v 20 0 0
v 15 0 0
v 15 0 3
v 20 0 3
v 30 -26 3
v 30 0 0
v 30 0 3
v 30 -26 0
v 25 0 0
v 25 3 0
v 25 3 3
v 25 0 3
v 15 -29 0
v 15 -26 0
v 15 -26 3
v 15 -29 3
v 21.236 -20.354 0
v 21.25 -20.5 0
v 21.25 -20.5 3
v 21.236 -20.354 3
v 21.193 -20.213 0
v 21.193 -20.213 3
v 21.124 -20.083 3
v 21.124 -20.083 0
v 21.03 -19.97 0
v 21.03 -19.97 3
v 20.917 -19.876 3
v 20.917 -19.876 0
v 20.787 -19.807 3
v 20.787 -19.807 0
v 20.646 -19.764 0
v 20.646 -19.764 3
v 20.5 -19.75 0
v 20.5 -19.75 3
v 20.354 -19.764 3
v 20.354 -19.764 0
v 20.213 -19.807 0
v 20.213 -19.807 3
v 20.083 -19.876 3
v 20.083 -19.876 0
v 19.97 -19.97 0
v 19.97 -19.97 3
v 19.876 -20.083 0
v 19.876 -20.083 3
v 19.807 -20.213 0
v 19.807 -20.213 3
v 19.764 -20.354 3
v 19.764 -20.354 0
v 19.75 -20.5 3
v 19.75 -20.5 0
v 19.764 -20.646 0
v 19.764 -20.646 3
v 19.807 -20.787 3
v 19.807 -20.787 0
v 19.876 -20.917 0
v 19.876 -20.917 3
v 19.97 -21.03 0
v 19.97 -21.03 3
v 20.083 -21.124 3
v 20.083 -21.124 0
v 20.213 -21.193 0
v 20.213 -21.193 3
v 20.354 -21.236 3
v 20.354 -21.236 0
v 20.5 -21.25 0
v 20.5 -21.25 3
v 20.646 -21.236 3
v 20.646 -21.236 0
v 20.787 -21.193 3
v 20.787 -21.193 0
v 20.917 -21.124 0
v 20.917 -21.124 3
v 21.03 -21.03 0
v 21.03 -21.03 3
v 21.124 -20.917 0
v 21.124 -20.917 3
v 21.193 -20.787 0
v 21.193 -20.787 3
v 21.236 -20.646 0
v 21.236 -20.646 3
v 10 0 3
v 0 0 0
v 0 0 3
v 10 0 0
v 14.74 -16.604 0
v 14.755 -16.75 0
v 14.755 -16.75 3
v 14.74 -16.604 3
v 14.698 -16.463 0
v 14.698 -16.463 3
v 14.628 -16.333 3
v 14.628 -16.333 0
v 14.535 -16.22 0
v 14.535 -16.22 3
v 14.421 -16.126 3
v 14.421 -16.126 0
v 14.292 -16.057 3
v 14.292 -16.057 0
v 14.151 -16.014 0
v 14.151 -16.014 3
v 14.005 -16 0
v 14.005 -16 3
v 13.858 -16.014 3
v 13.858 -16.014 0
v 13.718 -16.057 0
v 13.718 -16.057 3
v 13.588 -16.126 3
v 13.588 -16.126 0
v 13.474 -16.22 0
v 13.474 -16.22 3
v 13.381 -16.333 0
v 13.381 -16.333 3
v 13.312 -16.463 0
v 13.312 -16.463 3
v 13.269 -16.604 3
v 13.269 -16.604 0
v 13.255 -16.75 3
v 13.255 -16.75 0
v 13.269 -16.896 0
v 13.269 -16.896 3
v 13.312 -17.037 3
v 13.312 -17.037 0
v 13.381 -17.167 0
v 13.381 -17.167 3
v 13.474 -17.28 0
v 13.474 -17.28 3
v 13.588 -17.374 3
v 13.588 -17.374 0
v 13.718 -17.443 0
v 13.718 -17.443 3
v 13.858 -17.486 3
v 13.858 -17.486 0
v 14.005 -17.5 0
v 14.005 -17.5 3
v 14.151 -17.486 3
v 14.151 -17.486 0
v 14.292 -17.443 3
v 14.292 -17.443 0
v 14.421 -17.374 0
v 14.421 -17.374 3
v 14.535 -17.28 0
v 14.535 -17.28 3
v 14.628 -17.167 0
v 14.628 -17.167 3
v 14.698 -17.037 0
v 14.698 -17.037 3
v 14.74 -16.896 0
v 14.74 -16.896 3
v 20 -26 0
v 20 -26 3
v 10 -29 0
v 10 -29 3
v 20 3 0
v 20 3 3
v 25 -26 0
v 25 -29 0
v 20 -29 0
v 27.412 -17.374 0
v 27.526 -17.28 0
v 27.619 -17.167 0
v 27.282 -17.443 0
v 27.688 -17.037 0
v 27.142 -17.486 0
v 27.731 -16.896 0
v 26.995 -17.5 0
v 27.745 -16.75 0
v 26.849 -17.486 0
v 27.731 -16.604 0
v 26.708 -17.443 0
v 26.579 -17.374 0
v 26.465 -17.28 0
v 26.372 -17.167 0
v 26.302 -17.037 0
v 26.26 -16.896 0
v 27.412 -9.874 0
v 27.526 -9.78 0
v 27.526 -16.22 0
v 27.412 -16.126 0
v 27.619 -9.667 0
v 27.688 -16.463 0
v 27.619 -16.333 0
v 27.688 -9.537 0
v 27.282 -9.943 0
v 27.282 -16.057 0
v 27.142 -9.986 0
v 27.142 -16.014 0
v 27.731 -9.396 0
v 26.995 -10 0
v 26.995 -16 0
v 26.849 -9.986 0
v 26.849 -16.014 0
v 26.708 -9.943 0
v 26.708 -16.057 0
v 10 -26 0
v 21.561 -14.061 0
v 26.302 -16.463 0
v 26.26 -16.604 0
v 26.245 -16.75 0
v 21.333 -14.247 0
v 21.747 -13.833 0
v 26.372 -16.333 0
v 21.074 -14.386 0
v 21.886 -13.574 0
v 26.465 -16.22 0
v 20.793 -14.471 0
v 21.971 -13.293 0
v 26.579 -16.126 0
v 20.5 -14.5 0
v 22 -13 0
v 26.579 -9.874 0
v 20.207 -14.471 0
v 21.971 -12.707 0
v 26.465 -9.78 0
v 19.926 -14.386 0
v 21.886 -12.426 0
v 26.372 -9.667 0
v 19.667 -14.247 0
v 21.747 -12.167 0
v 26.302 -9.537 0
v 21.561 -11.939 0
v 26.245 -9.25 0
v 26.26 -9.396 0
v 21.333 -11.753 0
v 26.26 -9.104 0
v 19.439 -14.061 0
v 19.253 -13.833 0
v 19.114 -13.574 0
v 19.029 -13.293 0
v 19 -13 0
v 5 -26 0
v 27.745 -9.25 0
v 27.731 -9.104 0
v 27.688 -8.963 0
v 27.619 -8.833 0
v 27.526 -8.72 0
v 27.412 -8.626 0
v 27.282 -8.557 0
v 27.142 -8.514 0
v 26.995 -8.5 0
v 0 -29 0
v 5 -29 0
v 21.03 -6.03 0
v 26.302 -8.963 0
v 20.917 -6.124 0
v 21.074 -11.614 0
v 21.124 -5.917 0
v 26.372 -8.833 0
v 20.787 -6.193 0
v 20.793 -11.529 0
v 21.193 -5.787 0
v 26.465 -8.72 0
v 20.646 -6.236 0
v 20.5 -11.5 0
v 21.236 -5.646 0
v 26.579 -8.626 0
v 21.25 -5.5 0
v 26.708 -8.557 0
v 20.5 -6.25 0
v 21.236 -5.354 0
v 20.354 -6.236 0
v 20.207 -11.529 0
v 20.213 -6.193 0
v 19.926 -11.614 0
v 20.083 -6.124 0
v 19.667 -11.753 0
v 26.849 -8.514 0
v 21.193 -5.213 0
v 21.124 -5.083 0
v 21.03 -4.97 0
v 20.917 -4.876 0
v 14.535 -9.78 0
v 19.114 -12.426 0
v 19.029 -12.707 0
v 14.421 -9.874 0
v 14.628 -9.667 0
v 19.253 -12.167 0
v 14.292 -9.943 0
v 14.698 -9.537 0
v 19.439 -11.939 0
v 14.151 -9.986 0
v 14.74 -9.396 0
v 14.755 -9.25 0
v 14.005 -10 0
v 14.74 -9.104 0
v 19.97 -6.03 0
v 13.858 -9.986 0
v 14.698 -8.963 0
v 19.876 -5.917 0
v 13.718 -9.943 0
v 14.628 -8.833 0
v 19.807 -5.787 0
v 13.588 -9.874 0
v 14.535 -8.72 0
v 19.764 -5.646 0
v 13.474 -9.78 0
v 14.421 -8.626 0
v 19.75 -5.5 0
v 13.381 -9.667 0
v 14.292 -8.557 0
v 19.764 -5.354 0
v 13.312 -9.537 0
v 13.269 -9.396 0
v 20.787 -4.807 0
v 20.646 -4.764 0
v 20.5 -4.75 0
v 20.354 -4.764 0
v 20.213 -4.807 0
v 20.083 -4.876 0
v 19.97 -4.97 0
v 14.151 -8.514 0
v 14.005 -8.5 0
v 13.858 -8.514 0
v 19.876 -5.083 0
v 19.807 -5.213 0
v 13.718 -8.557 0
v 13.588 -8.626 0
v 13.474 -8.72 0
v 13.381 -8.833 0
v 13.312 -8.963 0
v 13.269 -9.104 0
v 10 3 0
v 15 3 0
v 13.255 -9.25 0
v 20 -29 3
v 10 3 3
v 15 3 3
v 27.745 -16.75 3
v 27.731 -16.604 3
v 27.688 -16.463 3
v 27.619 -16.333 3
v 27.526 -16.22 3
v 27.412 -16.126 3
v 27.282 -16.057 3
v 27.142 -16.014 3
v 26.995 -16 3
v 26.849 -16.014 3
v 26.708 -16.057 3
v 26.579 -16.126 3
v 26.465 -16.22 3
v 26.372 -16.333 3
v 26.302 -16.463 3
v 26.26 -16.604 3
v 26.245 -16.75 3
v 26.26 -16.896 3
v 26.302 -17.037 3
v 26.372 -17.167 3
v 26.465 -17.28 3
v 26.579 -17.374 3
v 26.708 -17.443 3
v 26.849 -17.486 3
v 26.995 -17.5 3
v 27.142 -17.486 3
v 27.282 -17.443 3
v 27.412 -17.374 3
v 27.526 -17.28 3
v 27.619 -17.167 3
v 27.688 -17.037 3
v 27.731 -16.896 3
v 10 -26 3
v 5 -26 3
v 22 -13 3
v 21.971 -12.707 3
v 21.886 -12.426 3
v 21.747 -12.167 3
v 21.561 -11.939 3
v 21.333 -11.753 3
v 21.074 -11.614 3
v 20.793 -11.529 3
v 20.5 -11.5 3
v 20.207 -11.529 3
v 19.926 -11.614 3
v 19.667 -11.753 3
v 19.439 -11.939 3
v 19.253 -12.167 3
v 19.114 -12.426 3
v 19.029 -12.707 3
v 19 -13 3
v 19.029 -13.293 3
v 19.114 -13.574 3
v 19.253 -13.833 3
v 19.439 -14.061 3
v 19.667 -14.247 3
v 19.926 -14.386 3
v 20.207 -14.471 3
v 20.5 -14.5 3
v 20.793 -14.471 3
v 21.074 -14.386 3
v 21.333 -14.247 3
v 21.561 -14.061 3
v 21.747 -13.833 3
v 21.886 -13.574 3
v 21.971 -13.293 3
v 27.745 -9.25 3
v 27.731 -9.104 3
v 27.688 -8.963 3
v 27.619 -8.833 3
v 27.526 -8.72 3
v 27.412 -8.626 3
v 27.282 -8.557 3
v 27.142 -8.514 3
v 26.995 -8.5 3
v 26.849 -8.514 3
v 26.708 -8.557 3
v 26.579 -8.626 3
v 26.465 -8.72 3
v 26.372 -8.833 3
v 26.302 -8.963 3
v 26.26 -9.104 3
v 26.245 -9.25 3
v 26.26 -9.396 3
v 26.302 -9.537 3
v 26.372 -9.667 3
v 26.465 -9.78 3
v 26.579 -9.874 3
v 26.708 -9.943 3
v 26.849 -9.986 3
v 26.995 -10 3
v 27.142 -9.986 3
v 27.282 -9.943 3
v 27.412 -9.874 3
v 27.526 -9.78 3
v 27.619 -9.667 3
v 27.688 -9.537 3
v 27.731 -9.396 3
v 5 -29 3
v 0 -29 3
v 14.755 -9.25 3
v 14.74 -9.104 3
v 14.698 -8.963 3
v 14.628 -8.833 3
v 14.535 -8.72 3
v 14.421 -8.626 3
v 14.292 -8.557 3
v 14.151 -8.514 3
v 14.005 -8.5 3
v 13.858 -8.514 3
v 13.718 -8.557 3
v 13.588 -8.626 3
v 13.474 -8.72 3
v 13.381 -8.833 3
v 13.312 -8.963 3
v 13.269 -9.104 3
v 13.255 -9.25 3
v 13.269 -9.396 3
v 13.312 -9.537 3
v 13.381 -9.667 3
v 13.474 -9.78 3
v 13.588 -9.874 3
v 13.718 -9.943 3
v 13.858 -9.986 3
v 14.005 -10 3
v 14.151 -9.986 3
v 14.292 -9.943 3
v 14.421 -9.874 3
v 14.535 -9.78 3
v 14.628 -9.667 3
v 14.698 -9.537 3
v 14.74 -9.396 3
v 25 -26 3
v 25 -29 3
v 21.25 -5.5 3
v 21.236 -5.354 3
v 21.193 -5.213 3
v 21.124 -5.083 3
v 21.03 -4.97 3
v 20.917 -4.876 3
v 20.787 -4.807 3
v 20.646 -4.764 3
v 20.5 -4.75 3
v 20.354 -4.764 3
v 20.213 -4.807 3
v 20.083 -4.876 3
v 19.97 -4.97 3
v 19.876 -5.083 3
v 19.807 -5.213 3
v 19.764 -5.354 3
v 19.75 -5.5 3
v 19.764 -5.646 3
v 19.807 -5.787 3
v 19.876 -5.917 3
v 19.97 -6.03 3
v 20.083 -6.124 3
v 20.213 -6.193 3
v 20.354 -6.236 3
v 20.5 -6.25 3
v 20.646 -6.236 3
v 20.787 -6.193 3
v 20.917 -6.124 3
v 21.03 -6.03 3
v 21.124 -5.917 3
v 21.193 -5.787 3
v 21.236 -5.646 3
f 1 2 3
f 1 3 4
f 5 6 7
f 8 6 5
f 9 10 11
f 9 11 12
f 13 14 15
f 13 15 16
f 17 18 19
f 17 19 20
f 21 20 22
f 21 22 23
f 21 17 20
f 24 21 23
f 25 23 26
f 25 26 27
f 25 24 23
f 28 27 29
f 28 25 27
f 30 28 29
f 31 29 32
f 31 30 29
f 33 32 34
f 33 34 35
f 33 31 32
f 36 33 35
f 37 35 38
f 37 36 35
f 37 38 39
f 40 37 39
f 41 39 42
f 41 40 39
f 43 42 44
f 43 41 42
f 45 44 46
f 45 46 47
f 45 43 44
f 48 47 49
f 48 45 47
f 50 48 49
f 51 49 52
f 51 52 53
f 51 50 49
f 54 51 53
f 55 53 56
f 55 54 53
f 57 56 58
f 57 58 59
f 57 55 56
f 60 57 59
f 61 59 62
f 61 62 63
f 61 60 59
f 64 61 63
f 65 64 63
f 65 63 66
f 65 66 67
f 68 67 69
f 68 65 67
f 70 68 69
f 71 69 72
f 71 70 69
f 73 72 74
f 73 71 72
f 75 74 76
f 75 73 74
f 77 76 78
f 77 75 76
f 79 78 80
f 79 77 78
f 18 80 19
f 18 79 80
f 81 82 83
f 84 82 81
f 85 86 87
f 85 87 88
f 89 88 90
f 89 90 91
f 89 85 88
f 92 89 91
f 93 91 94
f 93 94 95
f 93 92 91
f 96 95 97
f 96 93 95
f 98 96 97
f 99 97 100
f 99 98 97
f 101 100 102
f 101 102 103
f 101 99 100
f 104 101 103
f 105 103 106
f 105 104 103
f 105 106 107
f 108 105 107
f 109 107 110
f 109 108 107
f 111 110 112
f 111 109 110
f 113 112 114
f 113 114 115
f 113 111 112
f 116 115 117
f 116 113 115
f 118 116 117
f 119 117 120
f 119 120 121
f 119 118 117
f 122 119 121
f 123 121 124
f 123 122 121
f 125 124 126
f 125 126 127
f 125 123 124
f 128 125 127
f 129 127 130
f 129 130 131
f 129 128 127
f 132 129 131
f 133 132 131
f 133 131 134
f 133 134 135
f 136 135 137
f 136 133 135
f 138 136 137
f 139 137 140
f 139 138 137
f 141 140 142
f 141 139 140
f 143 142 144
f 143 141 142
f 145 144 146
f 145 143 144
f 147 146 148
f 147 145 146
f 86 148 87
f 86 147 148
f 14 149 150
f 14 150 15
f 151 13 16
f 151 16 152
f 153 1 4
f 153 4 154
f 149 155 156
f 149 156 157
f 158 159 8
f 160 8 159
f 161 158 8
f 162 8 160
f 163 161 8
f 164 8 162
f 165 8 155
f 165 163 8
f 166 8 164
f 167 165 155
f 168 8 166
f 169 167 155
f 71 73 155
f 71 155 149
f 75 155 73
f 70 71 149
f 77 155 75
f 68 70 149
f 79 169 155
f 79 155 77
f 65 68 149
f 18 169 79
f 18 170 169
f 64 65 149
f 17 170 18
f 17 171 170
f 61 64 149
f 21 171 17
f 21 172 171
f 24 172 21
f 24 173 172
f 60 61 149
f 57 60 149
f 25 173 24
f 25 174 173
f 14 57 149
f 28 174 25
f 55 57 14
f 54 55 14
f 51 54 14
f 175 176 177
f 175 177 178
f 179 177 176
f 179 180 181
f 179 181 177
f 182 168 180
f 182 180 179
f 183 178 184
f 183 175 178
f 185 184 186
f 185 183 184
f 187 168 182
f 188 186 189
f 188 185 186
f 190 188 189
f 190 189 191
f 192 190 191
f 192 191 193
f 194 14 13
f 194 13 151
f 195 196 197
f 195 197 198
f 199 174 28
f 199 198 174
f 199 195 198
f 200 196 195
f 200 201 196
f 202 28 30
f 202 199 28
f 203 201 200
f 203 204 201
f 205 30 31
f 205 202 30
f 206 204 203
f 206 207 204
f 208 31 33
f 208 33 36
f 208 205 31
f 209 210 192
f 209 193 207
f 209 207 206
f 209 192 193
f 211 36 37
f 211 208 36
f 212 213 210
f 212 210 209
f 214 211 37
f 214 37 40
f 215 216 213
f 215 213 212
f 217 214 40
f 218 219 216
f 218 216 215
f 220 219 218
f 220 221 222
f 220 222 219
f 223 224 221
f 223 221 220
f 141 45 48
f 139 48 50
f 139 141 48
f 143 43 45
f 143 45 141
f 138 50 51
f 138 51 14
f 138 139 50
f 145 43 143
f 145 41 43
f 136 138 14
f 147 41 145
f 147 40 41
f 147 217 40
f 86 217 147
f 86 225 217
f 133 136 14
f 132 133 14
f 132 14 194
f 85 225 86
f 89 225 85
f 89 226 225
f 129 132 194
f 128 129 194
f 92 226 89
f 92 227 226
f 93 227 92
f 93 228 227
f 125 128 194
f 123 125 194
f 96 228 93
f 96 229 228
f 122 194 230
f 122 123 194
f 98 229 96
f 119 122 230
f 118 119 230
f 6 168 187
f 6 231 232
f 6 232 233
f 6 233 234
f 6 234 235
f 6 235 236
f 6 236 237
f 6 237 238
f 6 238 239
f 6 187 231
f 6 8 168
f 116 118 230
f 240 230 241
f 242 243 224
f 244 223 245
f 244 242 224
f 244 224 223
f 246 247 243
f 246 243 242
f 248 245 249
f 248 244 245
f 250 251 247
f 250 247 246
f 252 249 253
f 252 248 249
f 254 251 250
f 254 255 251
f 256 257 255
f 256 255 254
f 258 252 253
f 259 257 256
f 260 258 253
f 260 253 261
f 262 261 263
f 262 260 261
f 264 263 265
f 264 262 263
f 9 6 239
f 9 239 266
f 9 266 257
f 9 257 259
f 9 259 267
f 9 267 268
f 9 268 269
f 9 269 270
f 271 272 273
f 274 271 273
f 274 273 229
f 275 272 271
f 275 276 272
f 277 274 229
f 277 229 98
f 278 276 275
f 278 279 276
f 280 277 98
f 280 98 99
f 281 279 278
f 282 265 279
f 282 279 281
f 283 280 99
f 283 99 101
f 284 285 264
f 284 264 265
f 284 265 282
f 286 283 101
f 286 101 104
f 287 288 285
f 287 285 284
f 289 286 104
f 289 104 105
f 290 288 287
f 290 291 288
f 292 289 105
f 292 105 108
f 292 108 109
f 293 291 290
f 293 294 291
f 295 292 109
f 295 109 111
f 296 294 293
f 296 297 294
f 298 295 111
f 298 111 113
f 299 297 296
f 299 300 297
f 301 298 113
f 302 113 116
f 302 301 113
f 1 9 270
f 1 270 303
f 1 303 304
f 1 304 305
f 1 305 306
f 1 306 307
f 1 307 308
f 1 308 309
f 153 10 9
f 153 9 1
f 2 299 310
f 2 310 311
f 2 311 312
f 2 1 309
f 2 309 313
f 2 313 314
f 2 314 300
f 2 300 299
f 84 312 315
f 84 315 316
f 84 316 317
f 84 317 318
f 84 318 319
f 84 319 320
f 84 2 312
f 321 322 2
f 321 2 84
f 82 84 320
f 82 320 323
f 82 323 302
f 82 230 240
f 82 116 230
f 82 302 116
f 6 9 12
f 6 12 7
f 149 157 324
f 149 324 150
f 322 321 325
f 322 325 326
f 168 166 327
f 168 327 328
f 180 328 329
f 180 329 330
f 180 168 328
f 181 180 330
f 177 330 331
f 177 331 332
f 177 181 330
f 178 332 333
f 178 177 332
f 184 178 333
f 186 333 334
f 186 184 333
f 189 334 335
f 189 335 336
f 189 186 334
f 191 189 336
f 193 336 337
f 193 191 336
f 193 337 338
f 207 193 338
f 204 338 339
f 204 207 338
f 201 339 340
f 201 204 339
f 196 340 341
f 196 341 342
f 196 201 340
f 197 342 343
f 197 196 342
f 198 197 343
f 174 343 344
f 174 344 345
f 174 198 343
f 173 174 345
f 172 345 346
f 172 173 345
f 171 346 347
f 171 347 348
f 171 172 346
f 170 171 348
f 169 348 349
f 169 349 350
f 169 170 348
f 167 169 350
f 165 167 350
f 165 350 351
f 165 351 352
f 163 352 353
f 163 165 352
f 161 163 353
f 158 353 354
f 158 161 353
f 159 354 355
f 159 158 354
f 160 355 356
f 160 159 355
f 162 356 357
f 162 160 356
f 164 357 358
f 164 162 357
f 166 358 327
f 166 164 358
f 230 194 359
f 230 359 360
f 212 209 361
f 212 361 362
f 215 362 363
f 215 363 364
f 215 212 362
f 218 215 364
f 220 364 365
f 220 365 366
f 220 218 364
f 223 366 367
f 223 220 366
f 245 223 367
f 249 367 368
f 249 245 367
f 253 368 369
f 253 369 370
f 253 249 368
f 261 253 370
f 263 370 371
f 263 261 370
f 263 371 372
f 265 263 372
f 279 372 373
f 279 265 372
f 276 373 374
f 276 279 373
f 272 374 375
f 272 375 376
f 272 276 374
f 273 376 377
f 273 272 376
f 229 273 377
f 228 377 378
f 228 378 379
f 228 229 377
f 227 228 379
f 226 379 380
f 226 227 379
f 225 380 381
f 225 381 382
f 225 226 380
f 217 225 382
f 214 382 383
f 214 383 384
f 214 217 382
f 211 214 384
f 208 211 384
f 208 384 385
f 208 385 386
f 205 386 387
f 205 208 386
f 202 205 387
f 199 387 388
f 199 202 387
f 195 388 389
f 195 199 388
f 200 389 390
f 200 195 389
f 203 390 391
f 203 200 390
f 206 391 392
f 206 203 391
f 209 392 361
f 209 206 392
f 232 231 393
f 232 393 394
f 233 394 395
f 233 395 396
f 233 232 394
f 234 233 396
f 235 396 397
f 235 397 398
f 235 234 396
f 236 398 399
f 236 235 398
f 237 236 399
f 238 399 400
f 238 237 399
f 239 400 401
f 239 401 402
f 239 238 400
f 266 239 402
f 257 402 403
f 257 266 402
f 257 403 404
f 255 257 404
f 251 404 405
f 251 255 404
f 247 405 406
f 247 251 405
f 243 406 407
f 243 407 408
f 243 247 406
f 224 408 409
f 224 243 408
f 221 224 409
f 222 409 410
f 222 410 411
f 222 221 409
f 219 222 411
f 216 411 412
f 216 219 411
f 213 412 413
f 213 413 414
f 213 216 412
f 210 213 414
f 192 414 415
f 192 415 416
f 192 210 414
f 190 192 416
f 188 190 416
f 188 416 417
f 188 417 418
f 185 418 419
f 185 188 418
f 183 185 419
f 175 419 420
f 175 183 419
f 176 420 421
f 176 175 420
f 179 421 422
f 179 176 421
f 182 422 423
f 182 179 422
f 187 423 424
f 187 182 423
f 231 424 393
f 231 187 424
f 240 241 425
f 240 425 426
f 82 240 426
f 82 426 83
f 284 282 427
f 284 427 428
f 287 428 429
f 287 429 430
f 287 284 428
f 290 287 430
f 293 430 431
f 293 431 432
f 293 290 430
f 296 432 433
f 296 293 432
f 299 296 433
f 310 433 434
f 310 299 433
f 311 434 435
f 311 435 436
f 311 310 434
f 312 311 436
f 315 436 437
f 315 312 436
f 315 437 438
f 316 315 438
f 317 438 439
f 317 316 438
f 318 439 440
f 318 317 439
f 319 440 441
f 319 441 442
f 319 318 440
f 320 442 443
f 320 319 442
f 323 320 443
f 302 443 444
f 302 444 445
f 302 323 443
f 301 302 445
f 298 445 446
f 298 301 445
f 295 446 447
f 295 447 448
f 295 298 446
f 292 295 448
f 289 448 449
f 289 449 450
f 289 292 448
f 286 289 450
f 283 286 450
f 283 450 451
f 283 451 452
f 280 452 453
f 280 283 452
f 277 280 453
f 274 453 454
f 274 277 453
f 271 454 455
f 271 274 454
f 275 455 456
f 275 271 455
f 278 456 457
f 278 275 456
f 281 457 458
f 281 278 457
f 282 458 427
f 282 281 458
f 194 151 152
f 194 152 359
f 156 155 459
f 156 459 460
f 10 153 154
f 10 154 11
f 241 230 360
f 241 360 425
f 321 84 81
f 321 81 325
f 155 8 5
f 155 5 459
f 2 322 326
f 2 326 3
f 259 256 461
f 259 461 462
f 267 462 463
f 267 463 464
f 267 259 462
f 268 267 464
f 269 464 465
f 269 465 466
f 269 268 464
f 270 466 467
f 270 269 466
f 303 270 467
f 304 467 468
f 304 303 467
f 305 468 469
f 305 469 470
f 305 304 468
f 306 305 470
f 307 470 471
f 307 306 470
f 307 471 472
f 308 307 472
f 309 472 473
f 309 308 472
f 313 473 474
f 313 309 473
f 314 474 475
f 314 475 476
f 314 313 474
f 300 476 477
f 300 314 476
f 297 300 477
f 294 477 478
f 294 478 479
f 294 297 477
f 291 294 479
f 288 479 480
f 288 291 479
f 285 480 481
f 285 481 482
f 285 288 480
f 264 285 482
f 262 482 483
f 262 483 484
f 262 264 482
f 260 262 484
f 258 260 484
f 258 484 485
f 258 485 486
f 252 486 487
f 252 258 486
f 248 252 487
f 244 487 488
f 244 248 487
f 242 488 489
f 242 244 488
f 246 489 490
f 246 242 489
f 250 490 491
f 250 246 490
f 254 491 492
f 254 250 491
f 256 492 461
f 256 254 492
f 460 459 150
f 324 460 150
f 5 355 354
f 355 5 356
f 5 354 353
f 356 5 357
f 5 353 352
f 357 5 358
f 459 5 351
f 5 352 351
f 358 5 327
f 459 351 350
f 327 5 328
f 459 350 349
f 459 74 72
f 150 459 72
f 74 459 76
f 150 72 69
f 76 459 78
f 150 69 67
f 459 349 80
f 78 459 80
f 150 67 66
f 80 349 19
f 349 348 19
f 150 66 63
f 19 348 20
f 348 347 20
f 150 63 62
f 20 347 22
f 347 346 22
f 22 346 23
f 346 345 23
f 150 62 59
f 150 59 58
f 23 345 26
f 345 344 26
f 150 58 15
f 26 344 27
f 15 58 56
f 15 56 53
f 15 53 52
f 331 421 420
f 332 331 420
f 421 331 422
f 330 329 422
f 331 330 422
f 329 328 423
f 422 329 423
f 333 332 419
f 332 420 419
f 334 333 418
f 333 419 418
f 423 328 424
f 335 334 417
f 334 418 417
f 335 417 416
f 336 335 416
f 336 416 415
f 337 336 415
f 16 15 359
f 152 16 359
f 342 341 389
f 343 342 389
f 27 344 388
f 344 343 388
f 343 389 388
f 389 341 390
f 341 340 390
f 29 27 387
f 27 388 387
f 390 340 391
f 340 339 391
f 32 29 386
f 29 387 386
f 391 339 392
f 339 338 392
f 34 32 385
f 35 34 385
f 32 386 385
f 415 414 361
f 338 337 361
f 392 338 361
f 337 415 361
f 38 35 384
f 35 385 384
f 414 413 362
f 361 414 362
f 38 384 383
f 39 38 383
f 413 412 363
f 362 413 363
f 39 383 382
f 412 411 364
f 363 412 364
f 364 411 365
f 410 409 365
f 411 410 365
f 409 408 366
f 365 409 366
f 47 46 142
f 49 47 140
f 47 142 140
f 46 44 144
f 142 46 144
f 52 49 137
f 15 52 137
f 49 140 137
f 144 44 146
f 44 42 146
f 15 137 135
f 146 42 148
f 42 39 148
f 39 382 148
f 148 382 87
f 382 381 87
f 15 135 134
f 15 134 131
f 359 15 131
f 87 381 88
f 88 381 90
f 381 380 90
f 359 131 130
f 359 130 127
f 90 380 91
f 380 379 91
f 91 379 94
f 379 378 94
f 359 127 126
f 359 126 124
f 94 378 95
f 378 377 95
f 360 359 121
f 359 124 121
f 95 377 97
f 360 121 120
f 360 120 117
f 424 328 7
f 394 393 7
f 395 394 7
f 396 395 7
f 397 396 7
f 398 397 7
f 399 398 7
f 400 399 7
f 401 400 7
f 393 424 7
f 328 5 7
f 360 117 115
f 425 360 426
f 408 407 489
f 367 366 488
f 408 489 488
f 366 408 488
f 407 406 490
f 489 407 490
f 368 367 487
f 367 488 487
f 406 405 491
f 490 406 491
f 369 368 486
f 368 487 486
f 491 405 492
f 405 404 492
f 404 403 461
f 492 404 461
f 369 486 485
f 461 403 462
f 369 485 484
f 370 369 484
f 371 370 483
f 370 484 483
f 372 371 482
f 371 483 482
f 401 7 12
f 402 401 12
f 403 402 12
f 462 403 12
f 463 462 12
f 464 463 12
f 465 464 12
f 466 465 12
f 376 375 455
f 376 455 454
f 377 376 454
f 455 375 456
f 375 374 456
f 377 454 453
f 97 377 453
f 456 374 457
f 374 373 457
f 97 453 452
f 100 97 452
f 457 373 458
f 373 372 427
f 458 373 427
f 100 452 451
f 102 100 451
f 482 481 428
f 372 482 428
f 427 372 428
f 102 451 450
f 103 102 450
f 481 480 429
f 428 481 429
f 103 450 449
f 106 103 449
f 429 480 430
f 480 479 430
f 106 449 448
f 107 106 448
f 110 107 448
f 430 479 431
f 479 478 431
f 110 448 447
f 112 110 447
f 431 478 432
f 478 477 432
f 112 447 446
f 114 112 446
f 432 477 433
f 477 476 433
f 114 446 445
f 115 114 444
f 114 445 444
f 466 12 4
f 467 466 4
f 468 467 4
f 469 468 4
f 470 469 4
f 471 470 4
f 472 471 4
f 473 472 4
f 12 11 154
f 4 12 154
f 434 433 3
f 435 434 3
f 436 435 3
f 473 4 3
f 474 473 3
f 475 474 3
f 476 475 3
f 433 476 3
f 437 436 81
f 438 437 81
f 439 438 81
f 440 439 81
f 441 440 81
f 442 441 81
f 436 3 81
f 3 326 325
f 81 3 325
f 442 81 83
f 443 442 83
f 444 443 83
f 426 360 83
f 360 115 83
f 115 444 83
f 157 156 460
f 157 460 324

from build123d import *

# Parameters (mm, degrees)
SKETCH1_R           = 0.75
SKETCH1_R_2         = 1.5
BOSS_EXTRUDE1_DEPTH = 3


with BuildPart() as part:
    # Sketch1 → Boss-Extrude1 (new body)
    with BuildSketch(Plane.XY):
        Polygon((10, 0), (10, 3), (15, 3), (15, 0), (20, 0), (20, 3), (25, 3), (25, 0), (30, 0), (30, -26), (25, -26), (25, -29), (20, -29), (20, -26), (15, -26), (15, -29), (10, -29), (10, -26), (5, -26), (5, -29), (0, -29), (0, 0), align=None)
        with Locations((20.5, -5.5)):
            Circle(SKETCH1_R, mode=Mode.SUBTRACT)
        with Locations((26.995190528, -9.25)):
            Circle(SKETCH1_R, mode=Mode.SUBTRACT)
        with Locations((26.995190528, -16.75)):
            Circle(SKETCH1_R, mode=Mode.SUBTRACT)
        with Locations((20.5, -20.5)):
            Circle(SKETCH1_R, mode=Mode.SUBTRACT)
        with Locations((14.004809472, -16.75)):
            Circle(SKETCH1_R, mode=Mode.SUBTRACT)
        with Locations((14.004809472, -9.25)):
            Circle(SKETCH1_R, mode=Mode.SUBTRACT)
        with Locations((20.5, -13)):
            Circle(SKETCH1_R_2, mode=Mode.SUBTRACT)
    extrude(amount=BOSS_EXTRUDE1_DEPTH)


solid = part.part
